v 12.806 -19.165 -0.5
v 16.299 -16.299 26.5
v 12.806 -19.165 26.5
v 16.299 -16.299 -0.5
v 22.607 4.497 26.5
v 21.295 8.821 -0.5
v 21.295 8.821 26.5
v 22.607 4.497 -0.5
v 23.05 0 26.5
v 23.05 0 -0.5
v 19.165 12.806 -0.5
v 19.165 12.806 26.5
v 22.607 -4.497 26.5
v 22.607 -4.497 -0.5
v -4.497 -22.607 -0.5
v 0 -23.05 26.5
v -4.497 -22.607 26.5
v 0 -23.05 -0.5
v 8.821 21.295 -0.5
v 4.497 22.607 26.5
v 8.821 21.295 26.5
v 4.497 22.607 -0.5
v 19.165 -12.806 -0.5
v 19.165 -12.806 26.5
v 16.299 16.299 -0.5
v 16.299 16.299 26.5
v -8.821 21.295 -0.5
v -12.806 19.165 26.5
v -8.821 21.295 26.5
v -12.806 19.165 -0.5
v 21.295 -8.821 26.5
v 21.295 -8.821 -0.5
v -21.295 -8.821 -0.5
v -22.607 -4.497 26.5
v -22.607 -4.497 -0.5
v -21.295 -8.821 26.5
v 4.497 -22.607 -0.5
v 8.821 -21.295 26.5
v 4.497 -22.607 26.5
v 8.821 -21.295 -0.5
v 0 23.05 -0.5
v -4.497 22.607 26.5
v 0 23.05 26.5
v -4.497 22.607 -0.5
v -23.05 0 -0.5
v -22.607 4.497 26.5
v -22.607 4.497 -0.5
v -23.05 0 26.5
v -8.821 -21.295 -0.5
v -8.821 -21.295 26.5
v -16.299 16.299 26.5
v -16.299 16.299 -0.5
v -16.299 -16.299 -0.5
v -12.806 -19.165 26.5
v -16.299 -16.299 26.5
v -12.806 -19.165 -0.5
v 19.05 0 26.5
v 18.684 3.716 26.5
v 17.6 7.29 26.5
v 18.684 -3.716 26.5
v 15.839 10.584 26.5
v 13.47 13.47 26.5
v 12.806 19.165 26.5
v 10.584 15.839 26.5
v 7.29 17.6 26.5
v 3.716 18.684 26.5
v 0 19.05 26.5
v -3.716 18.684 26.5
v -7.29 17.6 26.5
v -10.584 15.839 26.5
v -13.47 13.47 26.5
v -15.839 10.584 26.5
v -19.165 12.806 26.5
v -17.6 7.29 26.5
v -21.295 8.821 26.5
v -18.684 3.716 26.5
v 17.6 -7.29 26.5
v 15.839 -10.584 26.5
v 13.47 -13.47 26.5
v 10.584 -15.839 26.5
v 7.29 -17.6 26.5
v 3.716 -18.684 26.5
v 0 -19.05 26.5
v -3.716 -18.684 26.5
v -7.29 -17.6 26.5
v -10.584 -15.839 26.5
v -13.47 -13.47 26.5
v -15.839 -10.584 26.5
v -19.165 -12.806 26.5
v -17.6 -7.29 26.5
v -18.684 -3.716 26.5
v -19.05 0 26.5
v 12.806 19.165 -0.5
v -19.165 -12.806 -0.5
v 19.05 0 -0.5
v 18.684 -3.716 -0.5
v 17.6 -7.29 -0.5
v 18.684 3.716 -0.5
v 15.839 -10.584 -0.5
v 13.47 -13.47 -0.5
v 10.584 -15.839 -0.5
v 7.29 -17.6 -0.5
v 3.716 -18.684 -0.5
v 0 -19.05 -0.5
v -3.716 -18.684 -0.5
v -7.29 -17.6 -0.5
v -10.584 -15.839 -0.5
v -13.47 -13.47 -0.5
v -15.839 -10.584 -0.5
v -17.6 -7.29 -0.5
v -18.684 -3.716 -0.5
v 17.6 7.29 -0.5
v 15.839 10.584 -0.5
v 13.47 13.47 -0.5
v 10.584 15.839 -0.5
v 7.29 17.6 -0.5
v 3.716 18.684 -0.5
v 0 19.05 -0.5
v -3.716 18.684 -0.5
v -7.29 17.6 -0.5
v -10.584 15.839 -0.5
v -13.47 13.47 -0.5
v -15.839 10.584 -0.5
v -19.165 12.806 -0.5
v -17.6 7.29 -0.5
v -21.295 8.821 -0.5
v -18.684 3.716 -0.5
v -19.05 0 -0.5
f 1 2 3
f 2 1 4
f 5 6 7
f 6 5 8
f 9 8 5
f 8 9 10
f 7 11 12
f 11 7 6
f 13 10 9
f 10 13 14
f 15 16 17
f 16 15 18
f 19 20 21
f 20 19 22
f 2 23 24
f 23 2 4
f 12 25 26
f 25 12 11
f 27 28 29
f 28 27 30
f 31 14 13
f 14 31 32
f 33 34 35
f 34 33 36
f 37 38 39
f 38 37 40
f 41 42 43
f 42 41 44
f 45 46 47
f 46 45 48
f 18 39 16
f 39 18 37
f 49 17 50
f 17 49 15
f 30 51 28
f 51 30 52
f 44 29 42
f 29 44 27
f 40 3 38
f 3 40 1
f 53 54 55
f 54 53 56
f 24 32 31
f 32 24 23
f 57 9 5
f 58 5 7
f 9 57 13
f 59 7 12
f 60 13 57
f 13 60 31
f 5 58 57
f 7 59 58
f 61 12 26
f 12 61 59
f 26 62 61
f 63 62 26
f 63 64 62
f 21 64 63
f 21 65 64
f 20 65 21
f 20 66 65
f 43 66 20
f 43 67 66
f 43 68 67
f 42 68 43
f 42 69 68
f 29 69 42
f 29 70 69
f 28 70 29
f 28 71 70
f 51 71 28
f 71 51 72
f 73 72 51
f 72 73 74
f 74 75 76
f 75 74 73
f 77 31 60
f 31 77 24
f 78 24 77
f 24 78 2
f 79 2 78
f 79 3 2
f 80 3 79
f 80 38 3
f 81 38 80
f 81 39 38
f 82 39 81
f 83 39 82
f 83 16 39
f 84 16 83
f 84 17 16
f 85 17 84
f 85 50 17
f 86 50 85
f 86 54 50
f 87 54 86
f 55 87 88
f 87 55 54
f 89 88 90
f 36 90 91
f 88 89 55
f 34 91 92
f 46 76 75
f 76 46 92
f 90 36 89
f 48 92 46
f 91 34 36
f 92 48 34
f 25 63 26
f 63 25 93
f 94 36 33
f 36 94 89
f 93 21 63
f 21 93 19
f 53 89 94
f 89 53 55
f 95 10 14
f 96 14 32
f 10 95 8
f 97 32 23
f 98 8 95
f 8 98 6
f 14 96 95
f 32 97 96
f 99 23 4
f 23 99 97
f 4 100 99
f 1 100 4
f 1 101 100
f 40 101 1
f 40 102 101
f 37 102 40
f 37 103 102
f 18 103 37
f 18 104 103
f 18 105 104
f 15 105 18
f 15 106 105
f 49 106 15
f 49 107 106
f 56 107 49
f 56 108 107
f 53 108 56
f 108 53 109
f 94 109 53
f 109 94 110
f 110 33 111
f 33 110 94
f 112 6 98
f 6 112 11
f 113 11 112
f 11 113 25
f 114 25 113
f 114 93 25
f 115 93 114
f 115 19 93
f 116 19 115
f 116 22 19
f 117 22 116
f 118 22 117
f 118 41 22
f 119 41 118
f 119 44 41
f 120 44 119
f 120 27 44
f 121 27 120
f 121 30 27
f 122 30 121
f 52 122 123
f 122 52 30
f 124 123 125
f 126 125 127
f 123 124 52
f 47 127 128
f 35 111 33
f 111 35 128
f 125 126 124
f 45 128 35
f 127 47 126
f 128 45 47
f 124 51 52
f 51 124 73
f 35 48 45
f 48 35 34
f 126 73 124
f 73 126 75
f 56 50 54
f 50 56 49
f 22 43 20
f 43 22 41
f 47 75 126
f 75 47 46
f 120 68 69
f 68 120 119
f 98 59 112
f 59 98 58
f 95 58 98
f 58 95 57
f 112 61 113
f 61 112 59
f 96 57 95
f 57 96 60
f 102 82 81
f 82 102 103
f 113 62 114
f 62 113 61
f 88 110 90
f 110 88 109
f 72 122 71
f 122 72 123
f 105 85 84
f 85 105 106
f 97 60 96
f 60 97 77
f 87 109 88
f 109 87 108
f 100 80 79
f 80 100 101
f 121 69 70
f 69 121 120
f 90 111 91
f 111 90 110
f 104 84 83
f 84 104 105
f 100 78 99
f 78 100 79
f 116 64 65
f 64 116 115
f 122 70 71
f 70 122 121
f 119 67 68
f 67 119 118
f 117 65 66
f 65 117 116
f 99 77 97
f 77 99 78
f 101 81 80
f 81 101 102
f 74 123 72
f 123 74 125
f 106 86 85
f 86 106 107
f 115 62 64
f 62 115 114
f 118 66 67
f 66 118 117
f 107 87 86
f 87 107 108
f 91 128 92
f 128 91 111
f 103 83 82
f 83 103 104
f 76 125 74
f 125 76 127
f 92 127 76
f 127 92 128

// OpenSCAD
$fn = 32;

// ----------------------------------------------------------------------
// Two-module gear rim: z18 m2 and z18 m1.4, 26 mm wide
// ----------------------------------------------------------------------

// --- parameters (mm) ---
module_a = 2;             // first tooth module
teeth_a = 18;             // first band tooth count
module_b = 1.4;           // second tooth module
teeth_b = 18;             // second band tooth count
band_h = 10;              // height of one tooth band
web_t = 6;                // web thickness between the bands
total = 26;               // overall width over both bands
root_r = 15.5;            // root radius of the coarse band
hub_r = 23.05;            // hub radius
bore_d = 38.1;            // hub bore
hole_count = 4;           // lightening holes
hole_r = 10.75;           // lightening hole circle radius
hole_d = 4.28;            // lightening hole diameter

band_a = [[15.419, -1.579], [17.907, -1.575], [18.95, -1.21], [19.988, -0.682], [19.988, 0.682], [18.95, 1.21], [17.907, 1.575], [15.419, 1.579], [15.029, 3.79], [17.366, 4.644], [18.221, 5.344], [19.016, 6.196], [18.55, 7.477], [17.393, 7.618], [16.288, 7.605], [13.95, 6.757], [12.827, 8.702], [14.73, 10.304], [15.294, 11.254], [15.75, 12.326], [14.874, 13.37], [13.739, 13.107], [12.705, 12.717], [10.797, 11.121], [9.077, 12.564], [10.318, 14.72], [10.523, 15.806], [10.584, 16.97], [9.404, 17.651], [8.427, 17.016], [7.589, 16.296], [6.343, 14.143], [4.232, 14.911], [4.661, 17.362], [4.482, 18.452], [4.142, 19.566], [2.8, 19.803], [2.099, 18.872], [1.558, 17.909], [1.123, 15.459], [-1.123, 15.459], [-1.558, 17.909], [-2.099, 18.872], [-2.8, 19.803], [-4.142, 19.566], [-4.482, 18.452], [-4.661, 17.362], [-4.232, 14.911], [-6.343, 14.143], [-7.589, 16.296], [-8.427, 17.016], [-9.404, 17.651], [-10.584, 16.97], [-10.523, 15.806], [-10.318, 14.72], [-9.077, 12.564], [-10.797, 11.121], [-12.705, 12.717], [-13.739, 13.107], [-14.874, 13.37], [-15.75, 12.326], [-15.294, 11.254], [-14.73, 10.304], [-12.827, 8.702], [-13.95, 6.757], [-16.288, 7.605], [-17.393, 7.618], [-18.55, 7.477], [-19.016, 6.196], [-18.221, 5.344], [-17.366, 4.644], [-15.029, 3.79], [-15.419, 1.579], [-17.907, 1.575], [-18.95, 1.21], [-19.988, 0.682], [-19.988, -0.682], [-18.95, -1.21], [-17.907, -1.575], [-15.419, -1.579], [-15.029, -3.79], [-17.366, -4.644], [-18.221, -5.344], [-19.016, -6.196], [-18.55, -7.477], [-17.393, -7.618], [-16.288, -7.605], [-13.95, -6.757], [-12.827, -8.702], [-14.73, -10.304], [-15.294, -11.254], [-15.75, -12.326], [-14.874, -13.37], [-13.739, -13.107], [-12.705, -12.717], [-10.797, -11.121], [-9.077, -12.564], [-10.318, -14.72], [-10.523, -15.806], [-10.584, -16.97], [-9.404, -17.651], [-8.427, -17.016], [-7.589, -16.296], [-6.343, -14.143], [-4.232, -14.911], [-4.661, -17.362], [-4.482, -18.452], [-4.142, -19.566], [-2.8, -19.803], [-2.099, -18.872], [-1.558, -17.909], [-1.123, -15.459], [1.123, -15.459], [1.558, -17.909], [2.099, -18.872], [2.8, -19.803], [4.142, -19.566], [4.482, -18.452], [4.661, -17.362], [4.232, -14.911], [6.343, -14.143], [7.589, -16.296], [8.427, -17.016], [9.404, -17.651], [10.584, -16.97], [10.523, -15.806], [10.318, -14.72], [9.077, -12.564], [10.797, -11.121], [12.705, -12.717], [13.739, -13.107], [14.874, -13.37], [15.75, -12.326], [15.294, -11.254], [14.73, -10.304], [12.827, -8.702], [13.95, -6.757], [16.288, -7.605], [17.393, -7.618], [18.55, -7.477], [19.016, -6.196], [18.221, -5.344], [17.366, -4.644], [15.029, -3.79]];
band_b = [[10.794, -1.104], [12.545, -1.1], [13.27, -0.845], [13.992, -0.477], [13.992, 0.477], [13.27, 0.845], [12.545, 1.1], [10.794, 1.104], [10.52, 2.654], [12.165, 3.257], [12.758, 3.745], [13.311, 4.337], [12.985, 5.234], [12.181, 5.332], [11.413, 5.324], [9.765, 4.729], [8.978, 6.092], [10.317, 7.221], [10.708, 7.883], [11.025, 8.628], [10.412, 9.359], [9.622, 9.177], [8.903, 8.907], [7.559, 7.784], [6.353, 8.796], [7.225, 10.315], [7.366, 11.07], [7.409, 11.879], [6.583, 12.356], [5.903, 11.914], [5.32, 11.415], [4.441, 9.9], [2.961, 10.438], [3.262, 12.164], [3.136, 12.922], [2.899, 13.696], [1.96, 13.862], [1.472, 13.215], [1.095, 12.546], [0.787, 10.821], [-0.787, 10.821], [-1.095, 12.546], [-1.472, 13.215], [-1.96, 13.862], [-2.899, 13.696], [-3.136, 12.922], [-3.262, 12.164], [-2.961, 10.438], [-4.441, 9.9], [-5.32, 11.415], [-5.903, 11.914], [-6.583, 12.356], [-7.409, 11.879], [-7.366, 11.07], [-7.225, 10.315], [-6.353, 8.796], [-7.559, 7.784], [-8.903, 8.907], [-9.622, 9.177], [-10.412, 9.359], [-11.025, 8.628], [-10.708, 7.883], [-10.317, 7.221], [-8.978, 6.092], [-9.765, 4.729], [-11.413, 5.324], [-12.181, 5.332], [-12.985, 5.234], [-13.311, 4.337], [-12.758, 3.745], [-12.165, 3.257], [-10.52, 2.654], [-10.794, 1.104], [-12.545, 1.1], [-13.27, 0.845], [-13.992, 0.477], [-13.992, -0.477], [-13.27, -0.845], [-12.545, -1.1], [-10.794, -1.104], [-10.52, -2.654], [-12.165, -3.257], [-12.758, -3.745], [-13.311, -4.337], [-12.985, -5.234], [-12.181, -5.332], [-11.413, -5.324], [-9.765, -4.729], [-8.978, -6.092], [-10.317, -7.221], [-10.708, -7.883], [-11.025, -8.628], [-10.412, -9.359], [-9.622, -9.177], [-8.903, -8.907], [-7.559, -7.784], [-6.353, -8.796], [-7.225, -10.315], [-7.366, -11.07], [-7.409, -11.879], [-6.583, -12.356], [-5.903, -11.914], [-5.32, -11.415], [-4.441, -9.9], [-2.961, -10.438], [-3.262, -12.164], [-3.136, -12.922], [-2.899, -13.696], [-1.96, -13.862], [-1.472, -13.215], [-1.095, -12.546], [-0.787, -10.821], [0.787, -10.821], [1.095, -12.546], [1.472, -13.215], [1.96, -13.862], [2.899, -13.696], [3.136, -12.922], [3.262, -12.164], [2.961, -10.438], [4.441, -9.9], [5.32, -11.415], [5.903, -11.914], [6.583, -12.356], [7.409, -11.879], [7.366, -11.07], [7.225, -10.315], [6.353, -8.796], [7.559, -7.784], [8.903, -8.907], [9.622, -9.177], [10.412, -9.359], [11.025, -8.628], [10.708, -7.883], [10.317, -7.221], [8.978, -6.092], [9.765, -4.729], [11.413, -5.324], [12.181, -5.332], [12.985, -5.234], [13.311, -4.337], [12.758, -3.745], [12.165, -3.257], [10.52, -2.654]];

difference() {
  union() {
    /* tooth band A, overlapping the web by 0.4 mm */
    linear_extrude(height = band_h + 0.4) polygon(band_a);
    /* web */
    translate([0, 0, band_h - 0.4]) cylinder(h = web_t + 0.8, d = 2 * root_r);
    /* tooth band B */
    translate([0, 0, band_h + web_t]) linear_extrude(height = band_h + 0.4) polygon(band_b);
    /* hub */
    translate([0, 0, -0.5]) cylinder(h = total + 1.0, d = 2 * hub_r);
  }
  /* bore */
  translate([0, 0, -2.5]) cylinder(h = total + 5, d = bore_d);
  /* lightening holes through the web */
  for (i = [0 : hole_count - 1]) {
    a = i * 360 / hole_count;
    translate([hole_r * cos(a), hole_r * sin(a), -2.5]) cylinder(h = total + 5, d = hole_d);
  }
}
